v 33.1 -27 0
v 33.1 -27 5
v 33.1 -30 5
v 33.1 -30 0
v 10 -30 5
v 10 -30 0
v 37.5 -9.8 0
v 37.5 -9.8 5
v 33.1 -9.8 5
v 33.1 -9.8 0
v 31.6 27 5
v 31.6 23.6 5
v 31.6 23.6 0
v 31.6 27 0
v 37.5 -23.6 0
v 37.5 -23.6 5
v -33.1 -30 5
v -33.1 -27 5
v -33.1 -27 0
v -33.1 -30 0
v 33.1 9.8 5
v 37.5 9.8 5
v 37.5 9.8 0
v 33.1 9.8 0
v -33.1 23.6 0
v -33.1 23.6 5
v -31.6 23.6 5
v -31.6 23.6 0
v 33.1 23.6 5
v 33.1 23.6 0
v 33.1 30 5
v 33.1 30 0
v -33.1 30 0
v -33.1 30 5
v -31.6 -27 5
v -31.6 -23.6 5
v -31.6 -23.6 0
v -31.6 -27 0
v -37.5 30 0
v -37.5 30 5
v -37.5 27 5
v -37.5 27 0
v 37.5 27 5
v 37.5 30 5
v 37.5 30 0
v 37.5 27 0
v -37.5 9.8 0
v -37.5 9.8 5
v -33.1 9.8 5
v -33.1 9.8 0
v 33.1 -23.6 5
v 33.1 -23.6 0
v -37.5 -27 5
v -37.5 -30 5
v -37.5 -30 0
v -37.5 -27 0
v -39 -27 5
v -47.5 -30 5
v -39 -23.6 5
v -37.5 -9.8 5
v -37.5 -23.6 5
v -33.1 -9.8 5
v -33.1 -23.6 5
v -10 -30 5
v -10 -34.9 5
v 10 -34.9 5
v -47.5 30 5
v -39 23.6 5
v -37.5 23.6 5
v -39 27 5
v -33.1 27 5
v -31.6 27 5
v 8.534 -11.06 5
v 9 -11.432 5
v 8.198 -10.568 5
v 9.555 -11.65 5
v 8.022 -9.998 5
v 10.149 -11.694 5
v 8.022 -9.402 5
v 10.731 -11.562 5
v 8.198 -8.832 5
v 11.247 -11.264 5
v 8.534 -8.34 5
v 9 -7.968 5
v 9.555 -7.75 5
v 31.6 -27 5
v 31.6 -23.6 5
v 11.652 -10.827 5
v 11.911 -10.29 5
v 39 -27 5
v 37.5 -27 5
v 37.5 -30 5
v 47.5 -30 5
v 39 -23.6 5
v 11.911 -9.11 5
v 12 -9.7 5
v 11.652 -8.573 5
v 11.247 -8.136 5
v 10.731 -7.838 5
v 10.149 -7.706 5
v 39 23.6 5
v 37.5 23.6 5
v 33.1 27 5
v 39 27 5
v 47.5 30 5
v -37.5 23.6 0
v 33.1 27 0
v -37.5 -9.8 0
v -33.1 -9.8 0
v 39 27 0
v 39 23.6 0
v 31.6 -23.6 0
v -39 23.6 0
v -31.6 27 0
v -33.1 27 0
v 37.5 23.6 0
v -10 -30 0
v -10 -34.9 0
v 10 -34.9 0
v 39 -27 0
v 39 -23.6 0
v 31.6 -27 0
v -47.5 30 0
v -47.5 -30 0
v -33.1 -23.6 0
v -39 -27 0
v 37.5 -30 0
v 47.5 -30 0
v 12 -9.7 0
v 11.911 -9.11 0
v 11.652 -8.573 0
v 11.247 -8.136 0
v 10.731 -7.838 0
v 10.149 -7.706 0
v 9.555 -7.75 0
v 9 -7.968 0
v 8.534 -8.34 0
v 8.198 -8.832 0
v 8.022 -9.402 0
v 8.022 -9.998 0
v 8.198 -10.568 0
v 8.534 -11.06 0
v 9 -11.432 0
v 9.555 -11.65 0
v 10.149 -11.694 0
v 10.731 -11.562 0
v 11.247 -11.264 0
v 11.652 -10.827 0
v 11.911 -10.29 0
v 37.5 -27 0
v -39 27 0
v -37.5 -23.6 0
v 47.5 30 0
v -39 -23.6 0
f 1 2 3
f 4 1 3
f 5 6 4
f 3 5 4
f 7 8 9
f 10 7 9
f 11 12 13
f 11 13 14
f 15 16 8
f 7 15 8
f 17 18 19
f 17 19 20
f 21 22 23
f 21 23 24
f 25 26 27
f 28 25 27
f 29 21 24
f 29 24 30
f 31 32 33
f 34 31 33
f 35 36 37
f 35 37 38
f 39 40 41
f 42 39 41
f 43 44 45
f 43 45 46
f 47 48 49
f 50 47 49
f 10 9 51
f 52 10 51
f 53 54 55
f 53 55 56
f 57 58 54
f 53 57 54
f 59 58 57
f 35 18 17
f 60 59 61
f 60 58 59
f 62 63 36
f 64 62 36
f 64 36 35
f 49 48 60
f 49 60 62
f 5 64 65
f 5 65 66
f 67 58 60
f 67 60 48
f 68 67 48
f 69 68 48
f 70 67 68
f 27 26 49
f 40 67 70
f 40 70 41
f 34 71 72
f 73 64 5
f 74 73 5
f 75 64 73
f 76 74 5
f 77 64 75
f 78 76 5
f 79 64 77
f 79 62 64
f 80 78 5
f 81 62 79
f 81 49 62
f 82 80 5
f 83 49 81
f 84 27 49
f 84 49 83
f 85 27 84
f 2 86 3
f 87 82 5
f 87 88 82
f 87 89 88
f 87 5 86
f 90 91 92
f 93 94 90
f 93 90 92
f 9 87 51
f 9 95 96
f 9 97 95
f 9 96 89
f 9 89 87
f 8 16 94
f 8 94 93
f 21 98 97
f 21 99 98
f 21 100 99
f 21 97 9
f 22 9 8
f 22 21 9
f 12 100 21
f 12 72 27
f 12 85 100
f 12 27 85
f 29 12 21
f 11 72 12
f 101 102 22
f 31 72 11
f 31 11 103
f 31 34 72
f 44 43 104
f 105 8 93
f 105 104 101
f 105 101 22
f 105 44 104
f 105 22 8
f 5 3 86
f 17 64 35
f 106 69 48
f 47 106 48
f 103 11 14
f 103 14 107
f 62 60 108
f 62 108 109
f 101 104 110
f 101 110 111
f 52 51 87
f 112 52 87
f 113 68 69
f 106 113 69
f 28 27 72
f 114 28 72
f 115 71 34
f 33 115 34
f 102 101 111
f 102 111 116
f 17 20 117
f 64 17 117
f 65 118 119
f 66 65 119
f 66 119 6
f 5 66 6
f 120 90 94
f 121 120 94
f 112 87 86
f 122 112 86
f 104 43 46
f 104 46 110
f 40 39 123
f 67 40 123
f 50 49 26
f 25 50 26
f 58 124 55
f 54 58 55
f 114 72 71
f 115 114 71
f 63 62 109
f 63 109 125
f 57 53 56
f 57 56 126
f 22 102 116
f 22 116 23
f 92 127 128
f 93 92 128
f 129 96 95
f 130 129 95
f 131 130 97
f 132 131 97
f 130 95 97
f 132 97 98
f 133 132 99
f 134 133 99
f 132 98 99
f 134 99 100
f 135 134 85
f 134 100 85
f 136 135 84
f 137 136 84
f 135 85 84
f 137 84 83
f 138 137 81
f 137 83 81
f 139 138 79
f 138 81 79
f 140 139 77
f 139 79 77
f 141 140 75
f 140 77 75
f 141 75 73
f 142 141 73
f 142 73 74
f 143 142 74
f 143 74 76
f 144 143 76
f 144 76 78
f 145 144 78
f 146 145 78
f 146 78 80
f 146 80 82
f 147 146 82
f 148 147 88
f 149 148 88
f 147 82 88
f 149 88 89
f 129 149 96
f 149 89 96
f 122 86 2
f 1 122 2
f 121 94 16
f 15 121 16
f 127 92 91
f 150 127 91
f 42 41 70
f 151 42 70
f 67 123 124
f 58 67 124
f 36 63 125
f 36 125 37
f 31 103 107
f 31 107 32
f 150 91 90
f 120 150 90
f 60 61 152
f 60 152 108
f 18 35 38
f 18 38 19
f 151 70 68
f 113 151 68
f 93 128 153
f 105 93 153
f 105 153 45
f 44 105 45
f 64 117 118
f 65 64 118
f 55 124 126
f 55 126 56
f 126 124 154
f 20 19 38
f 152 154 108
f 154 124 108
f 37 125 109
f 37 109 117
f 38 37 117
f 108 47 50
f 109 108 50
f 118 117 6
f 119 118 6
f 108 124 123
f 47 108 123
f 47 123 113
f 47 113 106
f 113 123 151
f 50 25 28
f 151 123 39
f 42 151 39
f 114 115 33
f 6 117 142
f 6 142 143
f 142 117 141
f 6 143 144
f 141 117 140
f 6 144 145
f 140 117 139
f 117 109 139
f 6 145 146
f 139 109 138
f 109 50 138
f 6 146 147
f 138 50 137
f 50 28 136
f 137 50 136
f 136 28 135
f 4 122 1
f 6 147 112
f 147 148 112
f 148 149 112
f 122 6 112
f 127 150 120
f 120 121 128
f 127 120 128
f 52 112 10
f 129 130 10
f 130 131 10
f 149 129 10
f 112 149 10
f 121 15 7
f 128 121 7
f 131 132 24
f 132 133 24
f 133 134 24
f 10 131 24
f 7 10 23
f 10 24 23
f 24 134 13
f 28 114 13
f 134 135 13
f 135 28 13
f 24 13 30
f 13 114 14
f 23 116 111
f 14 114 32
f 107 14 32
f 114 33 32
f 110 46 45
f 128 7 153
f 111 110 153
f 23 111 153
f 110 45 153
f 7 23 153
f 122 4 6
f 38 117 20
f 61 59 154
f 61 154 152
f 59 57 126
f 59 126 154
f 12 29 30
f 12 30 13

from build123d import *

# Parameters (mm, degrees)
BOSS_EXTRUDE1_DEPTH = 5
CUT_EXTRUDE1_DEPTH  = 5
SKETCH4_R           = 2
CUT_EXTRUDE2_DEPTH  = 5


with BuildPart() as part:
    # Sketch1 → Boss-Extrude1 (new body)
    with BuildSketch(Plane.XY):
        Polygon((10, -30), (47.5, -30), (47.5, 30), (-47.5, 30), (-47.5, -30), (-10, -30), (-10, -34.9), (10, -34.9), align=None)
    extrude(amount=BOSS_EXTRUDE1_DEPTH)

    # Sketch3 → Cut-Extrude1 (cut)
    with BuildSketch(Plane.XY.offset(5)):
        Polygon((-33.1, -27), (-33.1, -30), (-37.5, -30), (-37.5, -27), (-39, -27), (-39, -23.6), (-37.5, -23.6), (-37.5, -9.8), (-33.1, -9.8), (-33.1, -23.6), (-31.6, -23.6), (-31.6, -27), align=None)
        Polygon((37.5, -30), (37.5, -27), (39, -27), (39, -23.6), (37.5, -23.6), (37.5, -9.8), (33.1, -9.8), (33.1, -23.6), (31.6, -23.6), (31.6, -27), (33.1, -27), (33.1, -30), align=None)
        Polygon((33.1, 27), (33.1, 30), (37.5, 30), (37.5, 27), (39, 27), (39, 23.6), (37.5, 23.6), (37.5, 9.8), (33.1, 9.8), (33.1, 23.6), (31.6, 23.6), (31.6, 27), align=None)
        Polygon((-37.5, 30), (-37.5, 27), (-39, 27), (-39, 23.6), (-37.5, 23.6), (-37.5, 9.8), (-33.1, 9.8), (-33.1, 23.6), (-31.6, 23.6), (-31.6, 27), (-33.1, 27), (-33.1, 30), align=None)
    extrude(amount=-CUT_EXTRUDE1_DEPTH, mode=Mode.SUBTRACT)

    # Sketch4 → Cut-Extrude2 (cut)
    with BuildSketch(Plane.XY.offset(5)):
        with Locations((10, -9.7)):
            Circle(SKETCH4_R)
    extrude(amount=-CUT_EXTRUDE2_DEPTH, mode=Mode.SUBTRACT)


solid = part.part
